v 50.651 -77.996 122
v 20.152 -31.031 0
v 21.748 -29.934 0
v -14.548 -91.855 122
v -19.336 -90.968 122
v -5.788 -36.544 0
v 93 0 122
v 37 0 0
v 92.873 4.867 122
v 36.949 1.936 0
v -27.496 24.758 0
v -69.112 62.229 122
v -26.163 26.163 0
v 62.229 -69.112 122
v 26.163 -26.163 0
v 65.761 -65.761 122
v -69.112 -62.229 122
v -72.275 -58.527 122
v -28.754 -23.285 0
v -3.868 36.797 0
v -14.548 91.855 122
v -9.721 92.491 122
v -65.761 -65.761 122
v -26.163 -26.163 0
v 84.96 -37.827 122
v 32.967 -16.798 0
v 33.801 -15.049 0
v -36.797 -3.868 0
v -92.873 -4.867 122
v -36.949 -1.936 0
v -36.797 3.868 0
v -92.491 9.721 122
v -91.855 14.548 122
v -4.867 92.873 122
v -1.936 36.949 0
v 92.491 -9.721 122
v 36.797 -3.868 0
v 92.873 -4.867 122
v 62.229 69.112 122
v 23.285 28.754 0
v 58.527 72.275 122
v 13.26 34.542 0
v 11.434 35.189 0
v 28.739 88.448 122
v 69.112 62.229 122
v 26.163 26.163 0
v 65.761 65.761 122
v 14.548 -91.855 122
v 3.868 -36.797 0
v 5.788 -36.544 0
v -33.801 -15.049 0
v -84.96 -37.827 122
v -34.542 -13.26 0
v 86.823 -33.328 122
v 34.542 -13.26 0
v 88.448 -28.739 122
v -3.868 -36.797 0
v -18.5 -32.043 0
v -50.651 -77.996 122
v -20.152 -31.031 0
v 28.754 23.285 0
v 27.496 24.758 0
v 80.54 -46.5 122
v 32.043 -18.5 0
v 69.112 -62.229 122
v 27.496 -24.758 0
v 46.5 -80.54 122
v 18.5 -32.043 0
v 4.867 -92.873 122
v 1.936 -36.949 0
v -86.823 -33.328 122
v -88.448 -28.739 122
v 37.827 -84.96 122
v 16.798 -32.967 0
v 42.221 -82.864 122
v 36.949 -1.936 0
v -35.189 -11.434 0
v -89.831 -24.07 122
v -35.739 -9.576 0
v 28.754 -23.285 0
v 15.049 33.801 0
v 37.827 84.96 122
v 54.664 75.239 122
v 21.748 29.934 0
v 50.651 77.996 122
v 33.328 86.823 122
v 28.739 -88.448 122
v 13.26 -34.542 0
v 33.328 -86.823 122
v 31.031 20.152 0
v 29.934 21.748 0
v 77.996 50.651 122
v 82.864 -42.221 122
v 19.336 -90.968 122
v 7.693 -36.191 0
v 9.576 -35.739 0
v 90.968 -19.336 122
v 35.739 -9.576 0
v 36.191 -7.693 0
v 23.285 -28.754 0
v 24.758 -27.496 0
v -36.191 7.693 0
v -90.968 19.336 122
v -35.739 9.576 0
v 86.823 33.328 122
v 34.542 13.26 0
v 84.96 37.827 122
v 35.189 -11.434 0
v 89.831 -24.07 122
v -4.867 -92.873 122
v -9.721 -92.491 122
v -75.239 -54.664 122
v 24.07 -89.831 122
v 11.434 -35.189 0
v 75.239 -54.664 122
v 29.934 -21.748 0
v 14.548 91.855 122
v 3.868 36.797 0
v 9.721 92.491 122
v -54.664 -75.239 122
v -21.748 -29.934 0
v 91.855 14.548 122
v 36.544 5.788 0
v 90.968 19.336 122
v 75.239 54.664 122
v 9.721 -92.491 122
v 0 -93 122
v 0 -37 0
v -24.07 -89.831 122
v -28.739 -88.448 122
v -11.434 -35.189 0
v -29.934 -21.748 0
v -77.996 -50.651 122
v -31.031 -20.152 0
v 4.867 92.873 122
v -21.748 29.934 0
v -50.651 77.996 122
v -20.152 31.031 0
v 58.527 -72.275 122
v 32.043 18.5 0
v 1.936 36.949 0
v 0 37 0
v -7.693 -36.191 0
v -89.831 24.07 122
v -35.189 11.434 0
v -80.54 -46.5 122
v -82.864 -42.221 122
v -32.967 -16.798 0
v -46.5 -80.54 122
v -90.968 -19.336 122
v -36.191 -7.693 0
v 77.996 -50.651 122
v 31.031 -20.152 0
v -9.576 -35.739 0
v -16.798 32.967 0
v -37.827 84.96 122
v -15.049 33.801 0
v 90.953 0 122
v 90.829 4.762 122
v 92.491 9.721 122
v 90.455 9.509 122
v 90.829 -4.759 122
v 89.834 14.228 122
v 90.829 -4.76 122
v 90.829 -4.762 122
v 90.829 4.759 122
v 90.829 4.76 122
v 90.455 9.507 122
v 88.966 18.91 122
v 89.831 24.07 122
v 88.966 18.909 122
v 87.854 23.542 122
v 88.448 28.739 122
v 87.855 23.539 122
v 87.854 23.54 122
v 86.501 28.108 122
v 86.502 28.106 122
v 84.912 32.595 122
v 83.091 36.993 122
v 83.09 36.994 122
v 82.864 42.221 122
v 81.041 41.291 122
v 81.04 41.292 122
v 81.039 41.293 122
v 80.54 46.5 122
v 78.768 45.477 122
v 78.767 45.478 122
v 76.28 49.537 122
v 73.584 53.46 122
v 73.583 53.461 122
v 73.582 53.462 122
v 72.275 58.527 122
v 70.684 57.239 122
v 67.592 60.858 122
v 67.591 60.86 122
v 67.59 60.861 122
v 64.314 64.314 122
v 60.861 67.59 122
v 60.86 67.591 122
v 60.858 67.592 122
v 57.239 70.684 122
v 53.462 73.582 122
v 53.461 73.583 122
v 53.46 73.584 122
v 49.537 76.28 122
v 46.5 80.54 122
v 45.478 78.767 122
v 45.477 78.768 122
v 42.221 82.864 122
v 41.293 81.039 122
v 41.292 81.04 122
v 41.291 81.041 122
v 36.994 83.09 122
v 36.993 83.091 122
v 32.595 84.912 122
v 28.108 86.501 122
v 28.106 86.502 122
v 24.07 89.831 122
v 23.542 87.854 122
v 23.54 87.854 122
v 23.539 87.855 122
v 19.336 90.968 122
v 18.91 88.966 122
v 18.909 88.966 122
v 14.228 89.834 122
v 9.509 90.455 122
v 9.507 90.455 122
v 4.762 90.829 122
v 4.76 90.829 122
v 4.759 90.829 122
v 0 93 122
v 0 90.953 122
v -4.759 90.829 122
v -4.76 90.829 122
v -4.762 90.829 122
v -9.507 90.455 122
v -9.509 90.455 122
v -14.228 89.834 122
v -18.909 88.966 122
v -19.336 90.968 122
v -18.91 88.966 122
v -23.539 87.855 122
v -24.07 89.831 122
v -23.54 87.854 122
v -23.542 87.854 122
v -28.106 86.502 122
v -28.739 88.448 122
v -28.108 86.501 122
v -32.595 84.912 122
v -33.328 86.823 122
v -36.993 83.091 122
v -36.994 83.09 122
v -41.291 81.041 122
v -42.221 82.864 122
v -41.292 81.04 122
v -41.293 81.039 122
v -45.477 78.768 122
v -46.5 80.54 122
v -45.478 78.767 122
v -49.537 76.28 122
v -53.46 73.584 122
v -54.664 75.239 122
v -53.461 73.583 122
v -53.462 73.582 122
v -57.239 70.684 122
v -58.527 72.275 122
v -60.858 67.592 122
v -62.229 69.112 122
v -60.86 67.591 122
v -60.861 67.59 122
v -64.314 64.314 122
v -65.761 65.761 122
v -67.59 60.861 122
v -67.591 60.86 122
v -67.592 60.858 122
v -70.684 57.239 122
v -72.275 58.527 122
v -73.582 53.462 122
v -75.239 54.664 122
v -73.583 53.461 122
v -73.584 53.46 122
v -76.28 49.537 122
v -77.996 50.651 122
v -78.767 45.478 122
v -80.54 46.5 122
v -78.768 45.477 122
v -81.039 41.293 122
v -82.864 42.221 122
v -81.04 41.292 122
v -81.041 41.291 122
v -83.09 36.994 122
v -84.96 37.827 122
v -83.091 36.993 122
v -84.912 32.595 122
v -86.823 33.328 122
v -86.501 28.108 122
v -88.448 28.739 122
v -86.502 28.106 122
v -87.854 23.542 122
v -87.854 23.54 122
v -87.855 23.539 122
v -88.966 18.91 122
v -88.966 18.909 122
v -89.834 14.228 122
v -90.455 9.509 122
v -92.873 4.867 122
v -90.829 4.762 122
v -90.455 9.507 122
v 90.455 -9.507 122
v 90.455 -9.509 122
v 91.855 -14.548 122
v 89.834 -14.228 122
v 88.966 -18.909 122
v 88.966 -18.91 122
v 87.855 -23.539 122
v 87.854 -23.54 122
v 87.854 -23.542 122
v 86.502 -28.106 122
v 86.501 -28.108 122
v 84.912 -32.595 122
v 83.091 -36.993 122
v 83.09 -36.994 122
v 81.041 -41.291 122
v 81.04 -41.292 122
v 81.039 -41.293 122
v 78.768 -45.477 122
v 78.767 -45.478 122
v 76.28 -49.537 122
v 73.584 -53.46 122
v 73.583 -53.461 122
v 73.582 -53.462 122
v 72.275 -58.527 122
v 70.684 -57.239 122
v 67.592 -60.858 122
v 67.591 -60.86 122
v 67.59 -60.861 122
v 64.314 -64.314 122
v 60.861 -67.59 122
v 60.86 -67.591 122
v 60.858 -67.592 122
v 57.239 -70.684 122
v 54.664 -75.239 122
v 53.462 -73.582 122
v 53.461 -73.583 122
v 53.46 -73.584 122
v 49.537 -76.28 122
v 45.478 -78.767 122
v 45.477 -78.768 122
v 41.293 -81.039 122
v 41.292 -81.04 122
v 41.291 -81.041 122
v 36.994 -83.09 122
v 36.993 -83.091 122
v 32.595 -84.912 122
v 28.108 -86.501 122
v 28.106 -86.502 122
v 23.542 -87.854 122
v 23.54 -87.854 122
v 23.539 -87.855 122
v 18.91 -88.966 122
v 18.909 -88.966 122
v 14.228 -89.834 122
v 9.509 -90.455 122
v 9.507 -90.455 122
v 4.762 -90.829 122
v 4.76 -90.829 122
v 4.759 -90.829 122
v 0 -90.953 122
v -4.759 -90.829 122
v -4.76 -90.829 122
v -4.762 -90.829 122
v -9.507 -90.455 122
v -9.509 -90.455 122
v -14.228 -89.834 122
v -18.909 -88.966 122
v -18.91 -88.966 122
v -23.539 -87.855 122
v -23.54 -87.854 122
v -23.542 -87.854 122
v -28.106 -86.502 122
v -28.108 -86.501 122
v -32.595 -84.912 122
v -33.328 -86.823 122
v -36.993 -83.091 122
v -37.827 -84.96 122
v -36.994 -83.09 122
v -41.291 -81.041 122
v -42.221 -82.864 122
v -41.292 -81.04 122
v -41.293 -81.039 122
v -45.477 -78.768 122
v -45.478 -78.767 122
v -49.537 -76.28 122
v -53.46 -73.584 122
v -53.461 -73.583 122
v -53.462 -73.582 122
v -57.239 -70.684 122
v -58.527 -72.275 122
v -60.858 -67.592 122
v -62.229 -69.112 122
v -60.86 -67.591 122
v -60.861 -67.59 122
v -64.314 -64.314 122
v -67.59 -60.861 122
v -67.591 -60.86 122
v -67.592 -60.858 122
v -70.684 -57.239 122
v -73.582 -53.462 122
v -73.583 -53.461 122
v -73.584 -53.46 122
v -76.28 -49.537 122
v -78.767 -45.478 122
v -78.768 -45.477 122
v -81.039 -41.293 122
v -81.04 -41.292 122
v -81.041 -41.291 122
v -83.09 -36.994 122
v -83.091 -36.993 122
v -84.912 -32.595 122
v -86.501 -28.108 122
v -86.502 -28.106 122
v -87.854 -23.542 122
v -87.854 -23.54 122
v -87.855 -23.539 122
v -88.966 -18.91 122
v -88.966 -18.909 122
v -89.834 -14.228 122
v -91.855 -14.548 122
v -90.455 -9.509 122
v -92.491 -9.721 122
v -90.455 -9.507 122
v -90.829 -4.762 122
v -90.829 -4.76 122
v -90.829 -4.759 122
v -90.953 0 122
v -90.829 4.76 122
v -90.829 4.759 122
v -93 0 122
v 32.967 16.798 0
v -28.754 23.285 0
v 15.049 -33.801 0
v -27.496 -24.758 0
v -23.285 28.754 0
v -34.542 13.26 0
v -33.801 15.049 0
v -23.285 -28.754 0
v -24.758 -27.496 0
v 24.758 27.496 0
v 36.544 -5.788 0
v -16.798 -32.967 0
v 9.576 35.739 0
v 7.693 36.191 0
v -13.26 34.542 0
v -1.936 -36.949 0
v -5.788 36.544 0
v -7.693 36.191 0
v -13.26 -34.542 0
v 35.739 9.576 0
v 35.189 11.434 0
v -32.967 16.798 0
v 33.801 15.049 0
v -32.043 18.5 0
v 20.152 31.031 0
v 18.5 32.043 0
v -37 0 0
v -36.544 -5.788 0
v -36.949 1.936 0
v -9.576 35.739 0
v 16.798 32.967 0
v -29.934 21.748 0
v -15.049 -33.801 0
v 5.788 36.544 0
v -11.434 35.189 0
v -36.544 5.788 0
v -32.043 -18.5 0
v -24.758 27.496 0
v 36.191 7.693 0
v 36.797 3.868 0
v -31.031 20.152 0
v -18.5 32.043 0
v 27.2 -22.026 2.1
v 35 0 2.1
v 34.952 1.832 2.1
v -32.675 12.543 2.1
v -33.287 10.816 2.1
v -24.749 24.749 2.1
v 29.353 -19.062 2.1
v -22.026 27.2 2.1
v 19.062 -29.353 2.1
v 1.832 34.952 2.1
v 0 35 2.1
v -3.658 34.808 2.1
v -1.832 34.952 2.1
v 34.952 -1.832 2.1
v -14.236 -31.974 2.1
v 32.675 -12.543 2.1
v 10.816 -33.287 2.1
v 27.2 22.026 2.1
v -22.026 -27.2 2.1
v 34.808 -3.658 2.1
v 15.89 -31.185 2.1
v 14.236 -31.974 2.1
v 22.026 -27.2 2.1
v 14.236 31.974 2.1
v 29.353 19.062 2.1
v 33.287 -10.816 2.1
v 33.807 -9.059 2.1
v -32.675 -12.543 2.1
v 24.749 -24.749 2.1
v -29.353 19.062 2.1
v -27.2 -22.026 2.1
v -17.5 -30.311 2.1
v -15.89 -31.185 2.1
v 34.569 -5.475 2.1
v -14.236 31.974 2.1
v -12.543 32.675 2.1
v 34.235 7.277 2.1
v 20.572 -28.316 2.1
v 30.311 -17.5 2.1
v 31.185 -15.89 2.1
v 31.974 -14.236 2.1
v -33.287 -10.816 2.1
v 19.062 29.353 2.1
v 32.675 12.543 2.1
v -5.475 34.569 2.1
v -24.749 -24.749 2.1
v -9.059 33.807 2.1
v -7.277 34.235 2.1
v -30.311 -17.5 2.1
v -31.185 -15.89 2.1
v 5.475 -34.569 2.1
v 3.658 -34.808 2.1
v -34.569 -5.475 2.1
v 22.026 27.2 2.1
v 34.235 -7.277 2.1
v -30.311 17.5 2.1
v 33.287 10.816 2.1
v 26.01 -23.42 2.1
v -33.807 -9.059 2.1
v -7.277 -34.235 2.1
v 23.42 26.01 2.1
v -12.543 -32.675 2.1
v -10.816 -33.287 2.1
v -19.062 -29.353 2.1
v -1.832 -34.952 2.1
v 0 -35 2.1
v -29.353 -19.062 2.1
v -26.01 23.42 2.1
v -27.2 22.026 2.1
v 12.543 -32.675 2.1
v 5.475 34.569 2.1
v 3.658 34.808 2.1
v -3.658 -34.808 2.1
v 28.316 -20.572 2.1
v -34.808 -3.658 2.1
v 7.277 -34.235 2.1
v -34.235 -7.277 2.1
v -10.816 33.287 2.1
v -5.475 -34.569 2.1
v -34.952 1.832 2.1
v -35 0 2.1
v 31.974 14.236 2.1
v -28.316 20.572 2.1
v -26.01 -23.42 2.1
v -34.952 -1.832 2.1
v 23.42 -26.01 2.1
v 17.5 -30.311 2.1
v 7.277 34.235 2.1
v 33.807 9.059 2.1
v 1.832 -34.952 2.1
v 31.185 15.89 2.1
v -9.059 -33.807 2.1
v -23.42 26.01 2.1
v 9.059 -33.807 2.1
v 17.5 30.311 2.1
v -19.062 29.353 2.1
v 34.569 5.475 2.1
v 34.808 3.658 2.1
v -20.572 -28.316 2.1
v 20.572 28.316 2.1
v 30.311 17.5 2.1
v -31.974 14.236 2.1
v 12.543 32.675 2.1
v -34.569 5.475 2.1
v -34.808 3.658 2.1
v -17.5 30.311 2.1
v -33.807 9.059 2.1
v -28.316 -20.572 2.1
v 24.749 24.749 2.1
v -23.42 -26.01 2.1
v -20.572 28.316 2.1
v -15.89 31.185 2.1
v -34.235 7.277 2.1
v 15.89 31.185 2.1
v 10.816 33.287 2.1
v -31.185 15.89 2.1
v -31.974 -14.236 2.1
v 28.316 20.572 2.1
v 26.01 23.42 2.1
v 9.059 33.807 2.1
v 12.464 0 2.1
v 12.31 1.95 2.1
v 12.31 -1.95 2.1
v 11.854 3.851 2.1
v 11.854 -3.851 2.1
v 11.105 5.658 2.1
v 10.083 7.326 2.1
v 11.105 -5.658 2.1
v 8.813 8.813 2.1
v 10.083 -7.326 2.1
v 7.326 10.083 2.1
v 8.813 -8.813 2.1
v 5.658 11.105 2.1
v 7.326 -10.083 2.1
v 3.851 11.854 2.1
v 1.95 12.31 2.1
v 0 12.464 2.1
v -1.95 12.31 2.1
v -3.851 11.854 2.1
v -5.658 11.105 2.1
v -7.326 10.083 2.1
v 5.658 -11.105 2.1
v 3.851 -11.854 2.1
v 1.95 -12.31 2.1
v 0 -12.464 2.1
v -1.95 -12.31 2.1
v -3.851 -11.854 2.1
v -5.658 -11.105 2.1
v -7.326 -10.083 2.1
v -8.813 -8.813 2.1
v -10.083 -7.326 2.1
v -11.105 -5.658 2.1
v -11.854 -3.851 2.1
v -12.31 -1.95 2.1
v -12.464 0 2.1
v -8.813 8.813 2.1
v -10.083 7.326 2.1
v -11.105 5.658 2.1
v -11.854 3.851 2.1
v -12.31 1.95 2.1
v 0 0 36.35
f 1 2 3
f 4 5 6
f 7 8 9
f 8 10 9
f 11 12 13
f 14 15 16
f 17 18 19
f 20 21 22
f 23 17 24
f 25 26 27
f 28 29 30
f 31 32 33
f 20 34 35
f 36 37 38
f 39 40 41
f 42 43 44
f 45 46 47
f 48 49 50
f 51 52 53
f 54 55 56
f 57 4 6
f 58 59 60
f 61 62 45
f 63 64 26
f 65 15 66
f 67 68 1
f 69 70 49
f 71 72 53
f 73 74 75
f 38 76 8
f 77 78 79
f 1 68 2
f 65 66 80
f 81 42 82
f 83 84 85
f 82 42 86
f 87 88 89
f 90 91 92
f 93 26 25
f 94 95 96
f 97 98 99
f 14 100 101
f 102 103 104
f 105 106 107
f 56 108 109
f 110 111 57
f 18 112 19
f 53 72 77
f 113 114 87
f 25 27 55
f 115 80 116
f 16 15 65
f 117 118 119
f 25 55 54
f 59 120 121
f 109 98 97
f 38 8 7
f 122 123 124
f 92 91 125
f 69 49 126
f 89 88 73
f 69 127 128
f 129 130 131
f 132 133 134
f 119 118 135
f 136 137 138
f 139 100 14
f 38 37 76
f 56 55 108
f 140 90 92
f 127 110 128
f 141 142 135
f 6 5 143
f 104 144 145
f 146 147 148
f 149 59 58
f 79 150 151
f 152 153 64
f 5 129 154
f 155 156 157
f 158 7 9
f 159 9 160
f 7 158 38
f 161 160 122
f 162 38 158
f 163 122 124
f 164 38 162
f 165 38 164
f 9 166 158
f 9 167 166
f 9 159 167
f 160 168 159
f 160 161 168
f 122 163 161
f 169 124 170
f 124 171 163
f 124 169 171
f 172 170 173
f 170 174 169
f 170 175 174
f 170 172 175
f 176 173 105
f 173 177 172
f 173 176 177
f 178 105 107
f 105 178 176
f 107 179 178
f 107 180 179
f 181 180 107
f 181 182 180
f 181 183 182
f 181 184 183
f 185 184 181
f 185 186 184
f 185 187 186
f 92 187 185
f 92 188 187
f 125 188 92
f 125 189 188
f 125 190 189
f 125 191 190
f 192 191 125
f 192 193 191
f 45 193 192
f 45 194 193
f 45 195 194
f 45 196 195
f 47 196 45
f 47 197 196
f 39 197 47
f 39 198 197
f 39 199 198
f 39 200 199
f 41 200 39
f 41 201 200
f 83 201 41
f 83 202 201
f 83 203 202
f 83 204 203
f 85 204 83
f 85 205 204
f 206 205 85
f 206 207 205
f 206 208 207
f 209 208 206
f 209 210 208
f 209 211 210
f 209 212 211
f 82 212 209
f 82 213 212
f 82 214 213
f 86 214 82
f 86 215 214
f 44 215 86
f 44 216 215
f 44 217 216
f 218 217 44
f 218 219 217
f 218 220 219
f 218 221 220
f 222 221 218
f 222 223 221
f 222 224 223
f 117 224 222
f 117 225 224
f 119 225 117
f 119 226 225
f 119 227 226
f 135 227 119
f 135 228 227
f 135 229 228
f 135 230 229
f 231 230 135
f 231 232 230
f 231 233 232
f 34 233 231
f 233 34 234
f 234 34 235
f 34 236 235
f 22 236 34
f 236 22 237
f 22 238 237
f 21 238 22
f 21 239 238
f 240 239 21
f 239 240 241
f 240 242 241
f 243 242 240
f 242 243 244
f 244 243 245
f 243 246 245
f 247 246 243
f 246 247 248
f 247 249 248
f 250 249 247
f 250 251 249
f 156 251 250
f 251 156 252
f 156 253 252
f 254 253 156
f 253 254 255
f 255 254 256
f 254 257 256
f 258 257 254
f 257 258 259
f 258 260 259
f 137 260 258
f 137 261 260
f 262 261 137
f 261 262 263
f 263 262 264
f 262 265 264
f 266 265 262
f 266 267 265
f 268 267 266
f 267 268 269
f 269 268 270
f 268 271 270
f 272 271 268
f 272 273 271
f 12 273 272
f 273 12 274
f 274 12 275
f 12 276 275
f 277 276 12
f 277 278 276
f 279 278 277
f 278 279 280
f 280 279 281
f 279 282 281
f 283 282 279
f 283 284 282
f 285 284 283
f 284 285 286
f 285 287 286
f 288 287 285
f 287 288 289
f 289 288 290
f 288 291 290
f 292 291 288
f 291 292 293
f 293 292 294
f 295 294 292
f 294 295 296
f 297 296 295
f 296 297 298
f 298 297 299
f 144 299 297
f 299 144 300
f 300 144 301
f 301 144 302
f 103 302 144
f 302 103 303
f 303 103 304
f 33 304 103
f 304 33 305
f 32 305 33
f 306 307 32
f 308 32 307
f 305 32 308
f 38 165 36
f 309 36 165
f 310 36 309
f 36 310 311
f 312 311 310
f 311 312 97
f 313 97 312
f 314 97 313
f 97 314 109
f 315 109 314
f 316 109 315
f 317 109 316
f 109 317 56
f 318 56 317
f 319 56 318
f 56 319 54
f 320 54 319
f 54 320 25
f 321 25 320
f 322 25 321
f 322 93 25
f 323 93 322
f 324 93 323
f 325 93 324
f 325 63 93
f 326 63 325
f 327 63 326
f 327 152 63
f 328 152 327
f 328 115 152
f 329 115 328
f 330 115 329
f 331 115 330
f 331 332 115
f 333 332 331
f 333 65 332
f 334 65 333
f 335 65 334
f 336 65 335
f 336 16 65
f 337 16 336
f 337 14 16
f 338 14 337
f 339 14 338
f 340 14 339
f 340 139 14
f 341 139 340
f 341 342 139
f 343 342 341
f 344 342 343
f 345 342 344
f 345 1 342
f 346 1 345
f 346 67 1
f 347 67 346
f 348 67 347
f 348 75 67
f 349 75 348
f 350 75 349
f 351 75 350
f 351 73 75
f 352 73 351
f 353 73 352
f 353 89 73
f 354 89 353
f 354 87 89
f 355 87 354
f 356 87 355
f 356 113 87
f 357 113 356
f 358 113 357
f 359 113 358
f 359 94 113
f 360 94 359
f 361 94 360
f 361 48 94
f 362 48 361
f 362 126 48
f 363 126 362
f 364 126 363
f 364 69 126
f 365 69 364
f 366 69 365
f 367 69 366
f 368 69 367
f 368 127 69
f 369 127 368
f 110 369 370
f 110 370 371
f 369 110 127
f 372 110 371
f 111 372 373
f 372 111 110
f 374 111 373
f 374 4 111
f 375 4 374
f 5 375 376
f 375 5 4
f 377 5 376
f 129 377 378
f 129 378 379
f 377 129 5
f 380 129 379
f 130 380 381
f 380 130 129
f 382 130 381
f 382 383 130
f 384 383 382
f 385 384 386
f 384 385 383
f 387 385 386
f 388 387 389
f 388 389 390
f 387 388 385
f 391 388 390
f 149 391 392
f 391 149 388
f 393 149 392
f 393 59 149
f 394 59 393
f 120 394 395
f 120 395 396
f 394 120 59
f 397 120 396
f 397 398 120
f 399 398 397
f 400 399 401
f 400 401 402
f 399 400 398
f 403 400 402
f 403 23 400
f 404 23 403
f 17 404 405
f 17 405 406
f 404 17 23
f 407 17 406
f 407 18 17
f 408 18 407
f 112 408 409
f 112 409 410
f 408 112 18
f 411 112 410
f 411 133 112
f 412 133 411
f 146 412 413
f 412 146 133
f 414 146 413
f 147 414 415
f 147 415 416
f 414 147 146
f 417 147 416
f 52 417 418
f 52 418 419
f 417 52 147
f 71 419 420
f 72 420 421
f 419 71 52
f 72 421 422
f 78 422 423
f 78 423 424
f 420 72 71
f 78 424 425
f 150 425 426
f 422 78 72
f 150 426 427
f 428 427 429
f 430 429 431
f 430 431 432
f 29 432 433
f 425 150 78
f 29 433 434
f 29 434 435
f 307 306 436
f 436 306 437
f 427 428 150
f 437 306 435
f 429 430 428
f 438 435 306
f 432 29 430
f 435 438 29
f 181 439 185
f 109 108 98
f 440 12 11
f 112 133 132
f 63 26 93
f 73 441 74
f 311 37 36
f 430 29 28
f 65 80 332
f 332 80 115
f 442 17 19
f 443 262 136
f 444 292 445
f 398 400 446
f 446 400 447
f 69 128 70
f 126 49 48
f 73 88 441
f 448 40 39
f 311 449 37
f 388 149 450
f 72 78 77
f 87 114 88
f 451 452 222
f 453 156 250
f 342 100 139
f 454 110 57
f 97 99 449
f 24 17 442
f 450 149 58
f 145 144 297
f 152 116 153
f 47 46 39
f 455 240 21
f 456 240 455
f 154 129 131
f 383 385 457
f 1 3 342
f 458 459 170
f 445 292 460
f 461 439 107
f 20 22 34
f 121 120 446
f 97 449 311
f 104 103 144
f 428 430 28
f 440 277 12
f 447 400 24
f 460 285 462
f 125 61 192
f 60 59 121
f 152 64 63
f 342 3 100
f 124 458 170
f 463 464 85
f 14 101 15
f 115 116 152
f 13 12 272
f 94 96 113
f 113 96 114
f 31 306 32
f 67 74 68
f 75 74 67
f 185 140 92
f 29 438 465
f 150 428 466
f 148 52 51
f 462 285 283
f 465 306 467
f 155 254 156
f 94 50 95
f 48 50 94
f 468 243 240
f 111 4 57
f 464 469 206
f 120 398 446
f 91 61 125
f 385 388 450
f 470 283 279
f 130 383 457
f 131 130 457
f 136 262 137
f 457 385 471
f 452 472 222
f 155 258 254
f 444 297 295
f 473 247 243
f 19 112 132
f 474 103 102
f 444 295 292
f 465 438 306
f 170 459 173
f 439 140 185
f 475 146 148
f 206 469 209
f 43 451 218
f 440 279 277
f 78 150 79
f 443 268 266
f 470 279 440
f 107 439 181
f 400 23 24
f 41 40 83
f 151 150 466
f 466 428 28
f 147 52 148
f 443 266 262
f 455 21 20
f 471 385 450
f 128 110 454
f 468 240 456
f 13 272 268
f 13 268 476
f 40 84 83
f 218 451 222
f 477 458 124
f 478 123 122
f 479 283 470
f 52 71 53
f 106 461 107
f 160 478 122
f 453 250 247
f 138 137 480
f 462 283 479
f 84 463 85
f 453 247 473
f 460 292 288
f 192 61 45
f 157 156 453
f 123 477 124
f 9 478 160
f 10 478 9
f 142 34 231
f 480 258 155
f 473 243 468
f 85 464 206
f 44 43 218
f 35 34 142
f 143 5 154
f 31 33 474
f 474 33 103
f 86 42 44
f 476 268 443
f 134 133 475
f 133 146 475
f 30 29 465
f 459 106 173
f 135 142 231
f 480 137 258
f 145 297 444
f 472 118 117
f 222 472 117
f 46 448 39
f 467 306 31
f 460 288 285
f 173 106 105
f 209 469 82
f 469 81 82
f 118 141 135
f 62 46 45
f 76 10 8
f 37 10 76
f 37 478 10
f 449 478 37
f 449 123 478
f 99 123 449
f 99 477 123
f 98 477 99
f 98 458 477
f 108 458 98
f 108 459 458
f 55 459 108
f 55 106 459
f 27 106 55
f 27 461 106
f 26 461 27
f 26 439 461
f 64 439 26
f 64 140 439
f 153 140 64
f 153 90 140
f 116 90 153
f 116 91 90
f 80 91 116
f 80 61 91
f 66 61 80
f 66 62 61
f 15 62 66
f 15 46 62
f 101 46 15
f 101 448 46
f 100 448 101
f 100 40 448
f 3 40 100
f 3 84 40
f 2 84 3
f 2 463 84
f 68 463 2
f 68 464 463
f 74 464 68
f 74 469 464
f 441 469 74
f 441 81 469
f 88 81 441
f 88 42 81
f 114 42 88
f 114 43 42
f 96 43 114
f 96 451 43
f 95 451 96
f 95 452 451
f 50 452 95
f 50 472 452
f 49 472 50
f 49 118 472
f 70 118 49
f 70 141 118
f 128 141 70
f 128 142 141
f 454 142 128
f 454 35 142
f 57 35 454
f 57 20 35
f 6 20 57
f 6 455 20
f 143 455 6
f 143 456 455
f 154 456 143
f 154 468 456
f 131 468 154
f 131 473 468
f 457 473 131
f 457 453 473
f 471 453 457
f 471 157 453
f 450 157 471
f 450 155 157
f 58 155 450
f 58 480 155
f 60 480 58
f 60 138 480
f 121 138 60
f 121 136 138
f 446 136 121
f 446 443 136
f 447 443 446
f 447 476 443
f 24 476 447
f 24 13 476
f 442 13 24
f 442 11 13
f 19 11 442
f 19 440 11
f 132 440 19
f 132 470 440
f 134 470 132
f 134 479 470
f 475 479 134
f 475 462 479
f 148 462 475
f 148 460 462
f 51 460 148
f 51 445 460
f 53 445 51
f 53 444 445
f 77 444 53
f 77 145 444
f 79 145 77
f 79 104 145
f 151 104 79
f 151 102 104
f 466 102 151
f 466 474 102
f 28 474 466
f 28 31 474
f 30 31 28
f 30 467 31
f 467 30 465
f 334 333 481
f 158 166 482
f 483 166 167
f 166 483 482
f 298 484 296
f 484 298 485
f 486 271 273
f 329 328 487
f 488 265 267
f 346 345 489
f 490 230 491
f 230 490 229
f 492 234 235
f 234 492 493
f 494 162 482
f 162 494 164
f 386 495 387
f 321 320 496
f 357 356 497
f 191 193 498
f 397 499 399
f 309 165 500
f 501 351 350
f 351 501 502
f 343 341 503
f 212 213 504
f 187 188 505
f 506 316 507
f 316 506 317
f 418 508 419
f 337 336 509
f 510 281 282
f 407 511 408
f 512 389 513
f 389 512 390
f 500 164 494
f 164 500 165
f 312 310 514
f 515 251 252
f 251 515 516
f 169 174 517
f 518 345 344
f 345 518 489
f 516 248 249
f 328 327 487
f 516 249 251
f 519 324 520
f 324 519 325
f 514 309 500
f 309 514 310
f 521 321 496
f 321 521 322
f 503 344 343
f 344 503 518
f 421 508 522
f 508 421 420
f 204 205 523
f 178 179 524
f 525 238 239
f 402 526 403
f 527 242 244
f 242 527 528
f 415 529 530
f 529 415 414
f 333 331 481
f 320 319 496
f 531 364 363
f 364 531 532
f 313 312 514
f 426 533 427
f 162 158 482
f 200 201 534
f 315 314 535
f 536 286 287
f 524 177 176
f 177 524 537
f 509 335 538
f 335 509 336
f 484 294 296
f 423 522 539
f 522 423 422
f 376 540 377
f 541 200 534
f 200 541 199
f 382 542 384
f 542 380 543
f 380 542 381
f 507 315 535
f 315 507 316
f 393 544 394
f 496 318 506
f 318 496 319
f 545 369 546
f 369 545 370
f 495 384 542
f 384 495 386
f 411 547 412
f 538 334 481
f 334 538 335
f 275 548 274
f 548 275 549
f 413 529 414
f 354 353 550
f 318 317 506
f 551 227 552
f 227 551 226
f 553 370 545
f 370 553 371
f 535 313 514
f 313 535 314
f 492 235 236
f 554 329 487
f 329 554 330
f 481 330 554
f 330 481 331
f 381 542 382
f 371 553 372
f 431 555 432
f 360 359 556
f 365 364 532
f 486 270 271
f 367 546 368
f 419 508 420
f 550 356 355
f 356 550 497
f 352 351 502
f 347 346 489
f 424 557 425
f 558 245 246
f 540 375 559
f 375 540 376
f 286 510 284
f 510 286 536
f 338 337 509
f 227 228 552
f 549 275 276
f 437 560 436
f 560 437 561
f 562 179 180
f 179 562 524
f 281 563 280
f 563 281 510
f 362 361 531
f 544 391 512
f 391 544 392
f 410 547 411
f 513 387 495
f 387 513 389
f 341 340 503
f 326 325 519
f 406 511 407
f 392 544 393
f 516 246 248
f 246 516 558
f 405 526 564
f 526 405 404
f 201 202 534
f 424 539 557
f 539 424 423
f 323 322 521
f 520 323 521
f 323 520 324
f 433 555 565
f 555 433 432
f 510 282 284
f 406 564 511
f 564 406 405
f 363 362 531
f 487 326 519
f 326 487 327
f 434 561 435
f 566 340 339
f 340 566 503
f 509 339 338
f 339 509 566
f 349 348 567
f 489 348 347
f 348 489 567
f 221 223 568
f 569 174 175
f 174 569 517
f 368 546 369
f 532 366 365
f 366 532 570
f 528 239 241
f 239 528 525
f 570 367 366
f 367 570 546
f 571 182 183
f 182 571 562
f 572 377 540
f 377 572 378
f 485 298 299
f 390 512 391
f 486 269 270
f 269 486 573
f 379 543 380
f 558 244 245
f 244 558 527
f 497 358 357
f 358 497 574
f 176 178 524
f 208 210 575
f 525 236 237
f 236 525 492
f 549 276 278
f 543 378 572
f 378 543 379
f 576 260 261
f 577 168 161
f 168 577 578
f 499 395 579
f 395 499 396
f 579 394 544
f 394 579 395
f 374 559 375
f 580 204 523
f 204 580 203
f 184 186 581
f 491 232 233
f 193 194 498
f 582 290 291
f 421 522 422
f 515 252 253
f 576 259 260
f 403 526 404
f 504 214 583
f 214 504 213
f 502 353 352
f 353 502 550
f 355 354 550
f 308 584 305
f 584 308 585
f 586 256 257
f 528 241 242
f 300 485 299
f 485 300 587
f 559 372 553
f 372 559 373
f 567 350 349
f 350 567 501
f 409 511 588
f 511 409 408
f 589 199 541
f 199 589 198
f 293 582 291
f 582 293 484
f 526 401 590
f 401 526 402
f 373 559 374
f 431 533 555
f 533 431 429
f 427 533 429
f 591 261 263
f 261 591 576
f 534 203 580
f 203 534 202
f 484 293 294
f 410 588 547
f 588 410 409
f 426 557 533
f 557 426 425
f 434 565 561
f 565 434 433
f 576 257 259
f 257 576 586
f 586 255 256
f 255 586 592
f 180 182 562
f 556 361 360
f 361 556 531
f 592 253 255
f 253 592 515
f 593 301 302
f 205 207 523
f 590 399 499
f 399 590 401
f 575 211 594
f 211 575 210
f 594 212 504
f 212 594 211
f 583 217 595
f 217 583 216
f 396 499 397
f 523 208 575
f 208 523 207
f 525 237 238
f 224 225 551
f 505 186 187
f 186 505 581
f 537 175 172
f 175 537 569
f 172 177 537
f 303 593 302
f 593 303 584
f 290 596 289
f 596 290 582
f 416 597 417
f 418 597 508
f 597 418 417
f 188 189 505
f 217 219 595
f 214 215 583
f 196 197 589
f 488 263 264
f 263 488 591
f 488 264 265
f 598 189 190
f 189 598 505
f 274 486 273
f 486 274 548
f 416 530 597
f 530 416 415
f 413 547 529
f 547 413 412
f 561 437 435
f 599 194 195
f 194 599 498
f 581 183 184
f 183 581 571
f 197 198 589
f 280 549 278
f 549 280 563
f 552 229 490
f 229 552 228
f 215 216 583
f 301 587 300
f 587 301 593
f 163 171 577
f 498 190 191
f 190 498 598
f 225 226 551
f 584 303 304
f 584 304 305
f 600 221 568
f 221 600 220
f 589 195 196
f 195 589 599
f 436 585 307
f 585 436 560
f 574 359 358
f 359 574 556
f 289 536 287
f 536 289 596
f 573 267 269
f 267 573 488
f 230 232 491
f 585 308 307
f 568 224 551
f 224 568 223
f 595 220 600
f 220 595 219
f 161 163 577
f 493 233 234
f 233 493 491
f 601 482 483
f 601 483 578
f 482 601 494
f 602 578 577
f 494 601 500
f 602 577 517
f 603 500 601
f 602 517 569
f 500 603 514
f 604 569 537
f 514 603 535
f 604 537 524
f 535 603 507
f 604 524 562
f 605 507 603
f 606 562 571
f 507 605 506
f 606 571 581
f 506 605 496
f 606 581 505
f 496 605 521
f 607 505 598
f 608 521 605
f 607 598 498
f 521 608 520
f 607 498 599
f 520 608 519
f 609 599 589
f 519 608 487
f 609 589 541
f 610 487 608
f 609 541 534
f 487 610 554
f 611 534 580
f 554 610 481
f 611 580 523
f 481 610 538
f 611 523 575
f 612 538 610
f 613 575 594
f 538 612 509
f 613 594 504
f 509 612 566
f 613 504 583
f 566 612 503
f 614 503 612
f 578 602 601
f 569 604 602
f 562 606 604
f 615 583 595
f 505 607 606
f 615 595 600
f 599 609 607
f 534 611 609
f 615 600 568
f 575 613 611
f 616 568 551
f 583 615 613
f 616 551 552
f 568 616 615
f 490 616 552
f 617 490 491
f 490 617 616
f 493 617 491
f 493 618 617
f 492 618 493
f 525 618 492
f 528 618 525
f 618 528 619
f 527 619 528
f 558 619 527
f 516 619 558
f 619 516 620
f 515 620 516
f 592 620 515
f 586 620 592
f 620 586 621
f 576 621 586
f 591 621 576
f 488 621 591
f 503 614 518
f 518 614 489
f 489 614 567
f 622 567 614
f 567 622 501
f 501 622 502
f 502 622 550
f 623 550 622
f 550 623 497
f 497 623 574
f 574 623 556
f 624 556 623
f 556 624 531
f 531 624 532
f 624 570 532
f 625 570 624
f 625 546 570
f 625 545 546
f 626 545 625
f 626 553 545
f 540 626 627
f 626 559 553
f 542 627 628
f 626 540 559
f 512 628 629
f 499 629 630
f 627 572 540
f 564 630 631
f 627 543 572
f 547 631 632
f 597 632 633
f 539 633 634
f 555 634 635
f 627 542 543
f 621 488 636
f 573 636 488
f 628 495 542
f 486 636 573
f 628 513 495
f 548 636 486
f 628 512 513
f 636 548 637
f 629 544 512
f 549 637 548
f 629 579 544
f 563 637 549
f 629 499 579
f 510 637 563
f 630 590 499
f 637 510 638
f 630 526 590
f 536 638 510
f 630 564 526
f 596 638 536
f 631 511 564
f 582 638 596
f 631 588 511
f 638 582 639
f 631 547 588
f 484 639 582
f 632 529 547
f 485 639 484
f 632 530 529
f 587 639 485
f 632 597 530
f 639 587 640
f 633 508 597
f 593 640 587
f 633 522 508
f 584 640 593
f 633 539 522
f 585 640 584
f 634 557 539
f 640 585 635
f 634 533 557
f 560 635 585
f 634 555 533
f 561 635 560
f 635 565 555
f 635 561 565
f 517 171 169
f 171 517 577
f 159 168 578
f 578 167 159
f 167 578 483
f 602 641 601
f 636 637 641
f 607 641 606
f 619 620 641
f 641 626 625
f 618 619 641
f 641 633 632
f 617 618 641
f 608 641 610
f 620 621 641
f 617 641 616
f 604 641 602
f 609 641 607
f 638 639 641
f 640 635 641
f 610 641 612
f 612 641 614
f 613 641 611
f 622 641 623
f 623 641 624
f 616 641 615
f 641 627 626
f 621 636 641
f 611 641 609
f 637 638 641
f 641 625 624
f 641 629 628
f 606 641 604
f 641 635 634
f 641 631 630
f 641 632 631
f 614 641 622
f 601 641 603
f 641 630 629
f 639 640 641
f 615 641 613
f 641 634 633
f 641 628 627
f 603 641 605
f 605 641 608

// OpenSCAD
$fa=3;
difference(){
    cylinder(r2 = 58.0+35, r1= 37, h =122);
   translate([0,0,2.1]) 
    cylinder(r2 = 56+35, r1= 35, h= 120);
}
translate([0,0,2])
    cylinder(r1 = 12.5, r2=0, h=68.7/2);
